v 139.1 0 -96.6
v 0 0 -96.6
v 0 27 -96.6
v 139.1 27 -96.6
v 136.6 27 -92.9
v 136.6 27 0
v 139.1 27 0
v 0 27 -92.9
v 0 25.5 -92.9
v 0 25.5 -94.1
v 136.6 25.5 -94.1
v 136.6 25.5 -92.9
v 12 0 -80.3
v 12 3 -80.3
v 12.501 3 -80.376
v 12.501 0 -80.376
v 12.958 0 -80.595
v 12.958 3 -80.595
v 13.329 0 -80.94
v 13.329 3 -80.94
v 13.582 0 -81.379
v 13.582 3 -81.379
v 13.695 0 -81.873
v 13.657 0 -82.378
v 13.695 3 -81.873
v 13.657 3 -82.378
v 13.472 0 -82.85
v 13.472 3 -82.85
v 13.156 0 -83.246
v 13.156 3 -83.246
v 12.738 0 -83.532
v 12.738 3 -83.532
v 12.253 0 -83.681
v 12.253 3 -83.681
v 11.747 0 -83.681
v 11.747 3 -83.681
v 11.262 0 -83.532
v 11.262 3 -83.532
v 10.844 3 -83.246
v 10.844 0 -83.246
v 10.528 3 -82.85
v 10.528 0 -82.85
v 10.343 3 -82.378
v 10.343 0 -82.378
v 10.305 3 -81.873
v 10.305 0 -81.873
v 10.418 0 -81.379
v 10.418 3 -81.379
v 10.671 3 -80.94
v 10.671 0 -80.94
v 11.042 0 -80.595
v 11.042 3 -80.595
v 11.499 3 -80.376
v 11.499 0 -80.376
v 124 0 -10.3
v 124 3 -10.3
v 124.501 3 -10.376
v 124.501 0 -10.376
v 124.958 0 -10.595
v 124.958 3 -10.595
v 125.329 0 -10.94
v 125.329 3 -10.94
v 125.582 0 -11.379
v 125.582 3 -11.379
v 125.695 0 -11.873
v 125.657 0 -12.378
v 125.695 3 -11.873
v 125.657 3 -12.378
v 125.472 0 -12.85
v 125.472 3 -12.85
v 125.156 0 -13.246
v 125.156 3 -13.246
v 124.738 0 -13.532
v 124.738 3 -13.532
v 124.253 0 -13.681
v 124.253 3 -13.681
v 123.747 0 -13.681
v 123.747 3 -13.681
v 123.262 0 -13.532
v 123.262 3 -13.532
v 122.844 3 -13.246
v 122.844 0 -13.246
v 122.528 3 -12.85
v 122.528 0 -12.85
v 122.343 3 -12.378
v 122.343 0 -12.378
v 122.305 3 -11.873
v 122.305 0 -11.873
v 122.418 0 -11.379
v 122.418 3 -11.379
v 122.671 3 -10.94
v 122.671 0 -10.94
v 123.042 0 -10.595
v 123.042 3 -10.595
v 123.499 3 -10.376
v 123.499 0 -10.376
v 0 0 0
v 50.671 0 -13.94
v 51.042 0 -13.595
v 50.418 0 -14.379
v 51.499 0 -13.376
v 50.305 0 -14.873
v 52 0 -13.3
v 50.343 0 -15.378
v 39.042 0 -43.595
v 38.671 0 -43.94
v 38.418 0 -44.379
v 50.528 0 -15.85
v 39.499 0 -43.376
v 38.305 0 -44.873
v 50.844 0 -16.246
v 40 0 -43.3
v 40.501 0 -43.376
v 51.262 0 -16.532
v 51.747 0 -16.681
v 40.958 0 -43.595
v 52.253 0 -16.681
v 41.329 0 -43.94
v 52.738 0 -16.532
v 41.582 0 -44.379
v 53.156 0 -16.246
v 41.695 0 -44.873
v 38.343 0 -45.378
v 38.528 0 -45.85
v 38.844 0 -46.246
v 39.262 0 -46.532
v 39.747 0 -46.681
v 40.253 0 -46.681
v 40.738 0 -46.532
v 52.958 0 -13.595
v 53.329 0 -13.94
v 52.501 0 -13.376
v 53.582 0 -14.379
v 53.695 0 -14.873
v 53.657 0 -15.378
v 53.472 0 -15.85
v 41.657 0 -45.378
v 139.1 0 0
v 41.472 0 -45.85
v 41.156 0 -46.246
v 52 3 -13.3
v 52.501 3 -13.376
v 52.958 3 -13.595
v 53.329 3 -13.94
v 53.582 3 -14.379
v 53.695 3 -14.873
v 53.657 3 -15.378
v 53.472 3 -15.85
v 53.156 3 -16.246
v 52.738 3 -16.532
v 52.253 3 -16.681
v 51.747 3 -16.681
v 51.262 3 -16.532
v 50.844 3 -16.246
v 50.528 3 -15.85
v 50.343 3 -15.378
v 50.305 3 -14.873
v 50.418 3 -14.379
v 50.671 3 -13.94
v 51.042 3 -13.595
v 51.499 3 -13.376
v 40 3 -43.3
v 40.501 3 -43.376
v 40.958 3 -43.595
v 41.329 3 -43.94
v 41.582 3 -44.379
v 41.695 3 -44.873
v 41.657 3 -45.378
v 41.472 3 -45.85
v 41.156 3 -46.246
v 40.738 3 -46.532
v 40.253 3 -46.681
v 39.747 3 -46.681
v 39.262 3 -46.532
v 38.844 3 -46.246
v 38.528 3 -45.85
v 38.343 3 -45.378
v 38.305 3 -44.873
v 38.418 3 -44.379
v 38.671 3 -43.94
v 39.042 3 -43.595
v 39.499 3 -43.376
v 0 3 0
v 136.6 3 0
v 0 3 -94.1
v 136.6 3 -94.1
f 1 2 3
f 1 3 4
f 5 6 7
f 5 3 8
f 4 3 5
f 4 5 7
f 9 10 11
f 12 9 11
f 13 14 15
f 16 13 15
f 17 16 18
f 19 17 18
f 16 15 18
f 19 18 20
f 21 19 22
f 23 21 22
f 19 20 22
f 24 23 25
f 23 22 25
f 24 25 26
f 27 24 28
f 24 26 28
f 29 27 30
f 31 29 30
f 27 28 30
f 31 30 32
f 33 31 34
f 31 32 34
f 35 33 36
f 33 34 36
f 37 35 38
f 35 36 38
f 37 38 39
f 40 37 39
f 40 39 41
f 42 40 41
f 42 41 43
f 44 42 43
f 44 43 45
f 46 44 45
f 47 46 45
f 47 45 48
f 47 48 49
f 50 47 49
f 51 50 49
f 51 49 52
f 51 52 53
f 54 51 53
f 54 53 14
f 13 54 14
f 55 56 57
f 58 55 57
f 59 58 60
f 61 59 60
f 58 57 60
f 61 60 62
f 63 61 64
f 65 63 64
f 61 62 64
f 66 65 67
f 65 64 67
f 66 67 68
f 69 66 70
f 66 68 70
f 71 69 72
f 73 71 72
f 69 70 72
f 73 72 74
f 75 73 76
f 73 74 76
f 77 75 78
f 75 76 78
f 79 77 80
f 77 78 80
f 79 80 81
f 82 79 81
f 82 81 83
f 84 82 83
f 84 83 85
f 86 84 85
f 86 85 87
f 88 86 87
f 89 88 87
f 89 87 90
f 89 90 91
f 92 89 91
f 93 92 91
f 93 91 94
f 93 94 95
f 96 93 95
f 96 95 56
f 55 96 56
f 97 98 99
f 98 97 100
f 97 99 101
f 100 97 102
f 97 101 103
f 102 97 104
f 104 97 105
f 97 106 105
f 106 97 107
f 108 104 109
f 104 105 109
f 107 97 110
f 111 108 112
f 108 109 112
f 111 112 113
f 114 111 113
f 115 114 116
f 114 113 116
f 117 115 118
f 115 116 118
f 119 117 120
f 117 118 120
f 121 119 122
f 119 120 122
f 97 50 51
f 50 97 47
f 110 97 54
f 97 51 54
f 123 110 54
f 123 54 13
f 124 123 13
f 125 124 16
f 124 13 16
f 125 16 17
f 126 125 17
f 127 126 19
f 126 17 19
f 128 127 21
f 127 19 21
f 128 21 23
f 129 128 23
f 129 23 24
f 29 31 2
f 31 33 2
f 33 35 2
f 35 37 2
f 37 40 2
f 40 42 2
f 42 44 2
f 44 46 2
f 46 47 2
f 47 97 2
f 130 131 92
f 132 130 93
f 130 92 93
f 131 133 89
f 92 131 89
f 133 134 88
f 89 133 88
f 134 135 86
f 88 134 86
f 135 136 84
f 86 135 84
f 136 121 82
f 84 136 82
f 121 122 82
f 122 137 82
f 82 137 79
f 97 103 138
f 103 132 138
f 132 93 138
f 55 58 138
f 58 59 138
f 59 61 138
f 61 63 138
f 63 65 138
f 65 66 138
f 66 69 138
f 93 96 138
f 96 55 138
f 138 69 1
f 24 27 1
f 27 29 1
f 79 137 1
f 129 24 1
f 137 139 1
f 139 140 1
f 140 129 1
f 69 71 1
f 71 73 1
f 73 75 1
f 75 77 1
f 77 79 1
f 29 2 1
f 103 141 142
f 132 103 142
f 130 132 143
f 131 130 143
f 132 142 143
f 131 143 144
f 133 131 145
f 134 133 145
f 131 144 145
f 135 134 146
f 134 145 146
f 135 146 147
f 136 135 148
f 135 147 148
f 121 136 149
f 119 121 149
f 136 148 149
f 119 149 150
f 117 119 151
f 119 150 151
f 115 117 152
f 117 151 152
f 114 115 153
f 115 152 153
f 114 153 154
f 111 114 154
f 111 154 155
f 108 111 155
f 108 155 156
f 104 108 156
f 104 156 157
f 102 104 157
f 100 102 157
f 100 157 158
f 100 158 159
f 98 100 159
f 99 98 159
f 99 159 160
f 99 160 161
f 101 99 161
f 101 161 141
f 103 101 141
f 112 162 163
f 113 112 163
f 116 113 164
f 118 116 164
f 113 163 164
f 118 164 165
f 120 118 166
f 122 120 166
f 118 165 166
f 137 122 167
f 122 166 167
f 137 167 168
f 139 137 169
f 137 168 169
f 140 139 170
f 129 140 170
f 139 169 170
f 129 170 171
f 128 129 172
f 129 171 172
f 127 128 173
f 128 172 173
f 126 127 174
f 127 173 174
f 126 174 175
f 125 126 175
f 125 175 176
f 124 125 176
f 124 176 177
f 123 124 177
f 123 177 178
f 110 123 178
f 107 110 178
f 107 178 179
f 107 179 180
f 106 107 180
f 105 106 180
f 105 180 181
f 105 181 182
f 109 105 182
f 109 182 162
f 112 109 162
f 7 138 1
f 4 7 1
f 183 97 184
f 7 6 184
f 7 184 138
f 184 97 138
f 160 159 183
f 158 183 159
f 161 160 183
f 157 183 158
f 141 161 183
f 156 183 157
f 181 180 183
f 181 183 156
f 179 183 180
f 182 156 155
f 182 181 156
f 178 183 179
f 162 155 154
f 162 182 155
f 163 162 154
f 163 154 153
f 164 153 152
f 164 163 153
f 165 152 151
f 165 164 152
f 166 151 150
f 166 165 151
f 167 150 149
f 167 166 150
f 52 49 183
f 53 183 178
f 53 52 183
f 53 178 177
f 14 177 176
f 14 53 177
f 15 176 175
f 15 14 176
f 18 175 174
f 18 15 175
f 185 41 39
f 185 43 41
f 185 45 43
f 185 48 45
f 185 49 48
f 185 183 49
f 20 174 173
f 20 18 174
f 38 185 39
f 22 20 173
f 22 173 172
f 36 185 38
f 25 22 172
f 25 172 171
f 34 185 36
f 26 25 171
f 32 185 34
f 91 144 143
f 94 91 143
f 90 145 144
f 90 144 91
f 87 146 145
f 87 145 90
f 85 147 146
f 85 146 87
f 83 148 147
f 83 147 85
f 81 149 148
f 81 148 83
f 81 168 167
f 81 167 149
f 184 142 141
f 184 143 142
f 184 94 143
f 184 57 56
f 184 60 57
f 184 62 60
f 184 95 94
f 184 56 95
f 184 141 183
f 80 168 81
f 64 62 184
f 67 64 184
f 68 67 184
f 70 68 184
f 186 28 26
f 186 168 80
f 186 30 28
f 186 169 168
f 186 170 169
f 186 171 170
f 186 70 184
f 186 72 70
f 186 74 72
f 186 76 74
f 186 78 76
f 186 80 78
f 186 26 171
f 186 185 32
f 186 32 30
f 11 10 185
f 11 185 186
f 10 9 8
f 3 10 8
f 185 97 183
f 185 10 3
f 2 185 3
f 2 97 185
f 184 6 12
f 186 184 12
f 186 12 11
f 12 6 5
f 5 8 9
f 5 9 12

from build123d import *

# Parameters (mm, degrees)
SKETCH1_W                     = 278.2
SKETCH1_H                     = 193.2
SHELL_BLOCK_DEPTH             = 27
SKETCH2_W                     = 273.2
SKETCH2_H                     = 185.8
FRONT_OPENING_DEPTH           = 1.5
SKETCH3_W                     = 273.2
SKETCH3_H                     = 188.2
DISPLAY_POCKET_DEPTH          = 22.5
SKETCH4_W                     = 3
SKETCH4_H                     = 56
VENT_SLOTS_DEPTH              = 4
SKETCH5_W                     = 58
SKETCH5_H                     = 16
CABLE_EXIT_X_SHORT_SIDE_DEPTH = 140.1
SKETCH6_R                     = 1.7
BOLT_HOLES_DEPTH              = 4
KEEP_ONE_HALF_X_DEPTH         = 172.491603293
KEEP_ONE_HALF_X_DEPTH_BACK    = 172.491603293
SKETCH7_W                     = 200
SKETCH7_H                     = 400
KEEP_ONE_QUARTER_Z_DEPTH      = 172.491603293
KEEP_ONE_QUARTER_Z_DEPTH_BACK = 172.491603293
SKETCH8_W                     = 400
SKETCH8_H                     = 200


with BuildPart() as part:
    # Sketch1 → Shell Block (new body)
    with BuildSketch(Plane(origin=(0, 0, 0), x_dir=(1, 0, 0), z_dir=(0, 1, 0))):
        Rectangle(SKETCH1_W, SKETCH1_H)
    extrude(amount=SHELL_BLOCK_DEPTH)

    # Sketch2 → Front Opening (cut)
    with BuildSketch(Plane(origin=(0, 27, 0), x_dir=(1, 0, 0), z_dir=(0, 1, 0))):
        Rectangle(SKETCH2_W, SKETCH2_H)
    extrude(amount=-FRONT_OPENING_DEPTH, mode=Mode.SUBTRACT)

    # Sketch3 → Display Pocket (cut)
    with BuildSketch(Plane(origin=(0, 25.5, 0), x_dir=(1, 0, 0), z_dir=(0, 1, 0))):
        Rectangle(SKETCH3_W, SKETCH3_H)
    extrude(amount=-DISPLAY_POCKET_DEPTH, mode=Mode.SUBTRACT)

    # Sketch4 → Vent Slots (cut)
    with BuildSketch(Plane(origin=(0, 3, 0), x_dir=(1, 0, 0), z_dir=(0, 1, 0))):
        with Locations((-67.5, 56)):
            Rectangle(SKETCH4_W, SKETCH4_H)
        with Locations((-67.5, -56)):
            Rectangle(SKETCH4_W, SKETCH4_H)
        with Locations((-75.5, 56)):
            Rectangle(SKETCH4_W, SKETCH4_H)
        with Locations((-75.5, -56)):
            Rectangle(SKETCH4_W, SKETCH4_H)
        with Locations((-83.5, 56)):
            Rectangle(SKETCH4_W, SKETCH4_H)
        with Locations((-83.5, -56)):
            Rectangle(SKETCH4_W, SKETCH4_H)
        with Locations((-91.5, 56)):
            Rectangle(SKETCH4_W, SKETCH4_H)
        with Locations((-91.5, -56)):
            Rectangle(SKETCH4_W, SKETCH4_H)
        with Locations((-99.5, 56)):
            Rectangle(SKETCH4_W, SKETCH4_H)
        with Locations((-99.5, -56)):
            Rectangle(SKETCH4_W, SKETCH4_H)
        with Locations((-107.5, 56)):
            Rectangle(SKETCH4_W, SKETCH4_H)
        with Locations((-107.5, -56)):
            Rectangle(SKETCH4_W, SKETCH4_H)
        with Locations((-115.5, 56)):
            Rectangle(SKETCH4_W, SKETCH4_H)
        with Locations((-115.5, -56)):
            Rectangle(SKETCH4_W, SKETCH4_H)
        with Locations((-123.5, 56)):
            Rectangle(SKETCH4_W, SKETCH4_H)
        with Locations((-123.5, -56)):
            Rectangle(SKETCH4_W, SKETCH4_H)
    extrude(amount=-VENT_SLOTS_DEPTH, mode=Mode.SUBTRACT)

    # Sketch5 → Cable Exit (-X short side) (cut)
    with BuildSketch(Plane(origin=(0, 0, 0), x_dir=(0, 0, -1), z_dir=(1, 0, 0))):
        with Locations((0, 13)):
            Rectangle(SKETCH5_W, SKETCH5_H)
    extrude(amount=-CABLE_EXIT_X_SHORT_SIDE_DEPTH, mode=Mode.SUBTRACT)

    # Sketch6 → Bolt Holes (cut)
    with BuildSketch(Plane(origin=(0, 3, 0), x_dir=(1, 0, 0), z_dir=(0, 1, 0))):
        with Locations(Location((-40, -45, 0), (0, 0, 270))):
            Circle(SKETCH6_R)
        with Locations(Location((-40, 45, 0), (0, 0, 270))):
            Circle(SKETCH6_R)
        with Locations(Location((40, -45, 0), (0, 0, 270))):
            Circle(SKETCH6_R)
        with Locations(Location((40, 45, 0), (0, 0, 270))):
            Circle(SKETCH6_R)
        with Locations(Location((-52, -15, 0), (0, 0, 270))):
            Circle(SKETCH6_R)
        with Locations(Location((-52, 15, 0), (0, 0, 270))):
            Circle(SKETCH6_R)
        with Locations(Location((52, -15, 0), (0, 0, 270))):
            Circle(SKETCH6_R)
        with Locations(Location((52, 15, 0), (0, 0, 270))):
            Circle(SKETCH6_R)
        with Locations(Location((-12, -82, 0), (0, 0, 270))):
            Circle(SKETCH6_R)
        with Locations(Location((-12, 82, 0), (0, 0, 270))):
            Circle(SKETCH6_R)
        with Locations(Location((12, -82, 0), (0, 0, 270))):
            Circle(SKETCH6_R)
        with Locations(Location((12, 82, 0), (0, 0, 270))):
            Circle(SKETCH6_R)
        with Locations(Location((-124, -12, 0), (0, 0, 270))):
            Circle(SKETCH6_R)
        with Locations(Location((-124, 12, 0), (0, 0, 270))):
            Circle(SKETCH6_R)
        with Locations(Location((124, -12, 0), (0, 0, 270))):
            Circle(SKETCH6_R)
        with Locations(Location((124, 12, 0), (0, 0, 270))):
            Circle(SKETCH6_R)
    extrude(amount=-BOLT_HOLES_DEPTH, mode=Mode.SUBTRACT)

    # Sketch7 → Keep one half (X) (cut, two sides: drawn at the far end of the back side and taken through both)
    with BuildSketch(Plane(origin=(0, 0, 0), x_dir=(1, 0, 0), z_dir=(0, 1, 0)).offset(-KEEP_ONE_HALF_X_DEPTH_BACK)):
        with Locations((-100, 0)):
            Rectangle(SKETCH7_W, SKETCH7_H)
    extrude(amount=KEEP_ONE_HALF_X_DEPTH + KEEP_ONE_HALF_X_DEPTH_BACK, mode=Mode.SUBTRACT)

    # Sketch8 → Keep one quarter (Z) (cut, two sides: drawn at the far end of the back side and taken through both)
    with BuildSketch(Plane(origin=(0, 0, 0), x_dir=(1, 0, 0), z_dir=(0, 1, 0)).offset(-KEEP_ONE_QUARTER_Z_DEPTH_BACK)):
        with Locations((0, -100)):
            Rectangle(SKETCH8_W, SKETCH8_H)
    extrude(amount=KEEP_ONE_QUARTER_Z_DEPTH + KEEP_ONE_QUARTER_Z_DEPTH_BACK, mode=Mode.SUBTRACT)


solid = part.part
